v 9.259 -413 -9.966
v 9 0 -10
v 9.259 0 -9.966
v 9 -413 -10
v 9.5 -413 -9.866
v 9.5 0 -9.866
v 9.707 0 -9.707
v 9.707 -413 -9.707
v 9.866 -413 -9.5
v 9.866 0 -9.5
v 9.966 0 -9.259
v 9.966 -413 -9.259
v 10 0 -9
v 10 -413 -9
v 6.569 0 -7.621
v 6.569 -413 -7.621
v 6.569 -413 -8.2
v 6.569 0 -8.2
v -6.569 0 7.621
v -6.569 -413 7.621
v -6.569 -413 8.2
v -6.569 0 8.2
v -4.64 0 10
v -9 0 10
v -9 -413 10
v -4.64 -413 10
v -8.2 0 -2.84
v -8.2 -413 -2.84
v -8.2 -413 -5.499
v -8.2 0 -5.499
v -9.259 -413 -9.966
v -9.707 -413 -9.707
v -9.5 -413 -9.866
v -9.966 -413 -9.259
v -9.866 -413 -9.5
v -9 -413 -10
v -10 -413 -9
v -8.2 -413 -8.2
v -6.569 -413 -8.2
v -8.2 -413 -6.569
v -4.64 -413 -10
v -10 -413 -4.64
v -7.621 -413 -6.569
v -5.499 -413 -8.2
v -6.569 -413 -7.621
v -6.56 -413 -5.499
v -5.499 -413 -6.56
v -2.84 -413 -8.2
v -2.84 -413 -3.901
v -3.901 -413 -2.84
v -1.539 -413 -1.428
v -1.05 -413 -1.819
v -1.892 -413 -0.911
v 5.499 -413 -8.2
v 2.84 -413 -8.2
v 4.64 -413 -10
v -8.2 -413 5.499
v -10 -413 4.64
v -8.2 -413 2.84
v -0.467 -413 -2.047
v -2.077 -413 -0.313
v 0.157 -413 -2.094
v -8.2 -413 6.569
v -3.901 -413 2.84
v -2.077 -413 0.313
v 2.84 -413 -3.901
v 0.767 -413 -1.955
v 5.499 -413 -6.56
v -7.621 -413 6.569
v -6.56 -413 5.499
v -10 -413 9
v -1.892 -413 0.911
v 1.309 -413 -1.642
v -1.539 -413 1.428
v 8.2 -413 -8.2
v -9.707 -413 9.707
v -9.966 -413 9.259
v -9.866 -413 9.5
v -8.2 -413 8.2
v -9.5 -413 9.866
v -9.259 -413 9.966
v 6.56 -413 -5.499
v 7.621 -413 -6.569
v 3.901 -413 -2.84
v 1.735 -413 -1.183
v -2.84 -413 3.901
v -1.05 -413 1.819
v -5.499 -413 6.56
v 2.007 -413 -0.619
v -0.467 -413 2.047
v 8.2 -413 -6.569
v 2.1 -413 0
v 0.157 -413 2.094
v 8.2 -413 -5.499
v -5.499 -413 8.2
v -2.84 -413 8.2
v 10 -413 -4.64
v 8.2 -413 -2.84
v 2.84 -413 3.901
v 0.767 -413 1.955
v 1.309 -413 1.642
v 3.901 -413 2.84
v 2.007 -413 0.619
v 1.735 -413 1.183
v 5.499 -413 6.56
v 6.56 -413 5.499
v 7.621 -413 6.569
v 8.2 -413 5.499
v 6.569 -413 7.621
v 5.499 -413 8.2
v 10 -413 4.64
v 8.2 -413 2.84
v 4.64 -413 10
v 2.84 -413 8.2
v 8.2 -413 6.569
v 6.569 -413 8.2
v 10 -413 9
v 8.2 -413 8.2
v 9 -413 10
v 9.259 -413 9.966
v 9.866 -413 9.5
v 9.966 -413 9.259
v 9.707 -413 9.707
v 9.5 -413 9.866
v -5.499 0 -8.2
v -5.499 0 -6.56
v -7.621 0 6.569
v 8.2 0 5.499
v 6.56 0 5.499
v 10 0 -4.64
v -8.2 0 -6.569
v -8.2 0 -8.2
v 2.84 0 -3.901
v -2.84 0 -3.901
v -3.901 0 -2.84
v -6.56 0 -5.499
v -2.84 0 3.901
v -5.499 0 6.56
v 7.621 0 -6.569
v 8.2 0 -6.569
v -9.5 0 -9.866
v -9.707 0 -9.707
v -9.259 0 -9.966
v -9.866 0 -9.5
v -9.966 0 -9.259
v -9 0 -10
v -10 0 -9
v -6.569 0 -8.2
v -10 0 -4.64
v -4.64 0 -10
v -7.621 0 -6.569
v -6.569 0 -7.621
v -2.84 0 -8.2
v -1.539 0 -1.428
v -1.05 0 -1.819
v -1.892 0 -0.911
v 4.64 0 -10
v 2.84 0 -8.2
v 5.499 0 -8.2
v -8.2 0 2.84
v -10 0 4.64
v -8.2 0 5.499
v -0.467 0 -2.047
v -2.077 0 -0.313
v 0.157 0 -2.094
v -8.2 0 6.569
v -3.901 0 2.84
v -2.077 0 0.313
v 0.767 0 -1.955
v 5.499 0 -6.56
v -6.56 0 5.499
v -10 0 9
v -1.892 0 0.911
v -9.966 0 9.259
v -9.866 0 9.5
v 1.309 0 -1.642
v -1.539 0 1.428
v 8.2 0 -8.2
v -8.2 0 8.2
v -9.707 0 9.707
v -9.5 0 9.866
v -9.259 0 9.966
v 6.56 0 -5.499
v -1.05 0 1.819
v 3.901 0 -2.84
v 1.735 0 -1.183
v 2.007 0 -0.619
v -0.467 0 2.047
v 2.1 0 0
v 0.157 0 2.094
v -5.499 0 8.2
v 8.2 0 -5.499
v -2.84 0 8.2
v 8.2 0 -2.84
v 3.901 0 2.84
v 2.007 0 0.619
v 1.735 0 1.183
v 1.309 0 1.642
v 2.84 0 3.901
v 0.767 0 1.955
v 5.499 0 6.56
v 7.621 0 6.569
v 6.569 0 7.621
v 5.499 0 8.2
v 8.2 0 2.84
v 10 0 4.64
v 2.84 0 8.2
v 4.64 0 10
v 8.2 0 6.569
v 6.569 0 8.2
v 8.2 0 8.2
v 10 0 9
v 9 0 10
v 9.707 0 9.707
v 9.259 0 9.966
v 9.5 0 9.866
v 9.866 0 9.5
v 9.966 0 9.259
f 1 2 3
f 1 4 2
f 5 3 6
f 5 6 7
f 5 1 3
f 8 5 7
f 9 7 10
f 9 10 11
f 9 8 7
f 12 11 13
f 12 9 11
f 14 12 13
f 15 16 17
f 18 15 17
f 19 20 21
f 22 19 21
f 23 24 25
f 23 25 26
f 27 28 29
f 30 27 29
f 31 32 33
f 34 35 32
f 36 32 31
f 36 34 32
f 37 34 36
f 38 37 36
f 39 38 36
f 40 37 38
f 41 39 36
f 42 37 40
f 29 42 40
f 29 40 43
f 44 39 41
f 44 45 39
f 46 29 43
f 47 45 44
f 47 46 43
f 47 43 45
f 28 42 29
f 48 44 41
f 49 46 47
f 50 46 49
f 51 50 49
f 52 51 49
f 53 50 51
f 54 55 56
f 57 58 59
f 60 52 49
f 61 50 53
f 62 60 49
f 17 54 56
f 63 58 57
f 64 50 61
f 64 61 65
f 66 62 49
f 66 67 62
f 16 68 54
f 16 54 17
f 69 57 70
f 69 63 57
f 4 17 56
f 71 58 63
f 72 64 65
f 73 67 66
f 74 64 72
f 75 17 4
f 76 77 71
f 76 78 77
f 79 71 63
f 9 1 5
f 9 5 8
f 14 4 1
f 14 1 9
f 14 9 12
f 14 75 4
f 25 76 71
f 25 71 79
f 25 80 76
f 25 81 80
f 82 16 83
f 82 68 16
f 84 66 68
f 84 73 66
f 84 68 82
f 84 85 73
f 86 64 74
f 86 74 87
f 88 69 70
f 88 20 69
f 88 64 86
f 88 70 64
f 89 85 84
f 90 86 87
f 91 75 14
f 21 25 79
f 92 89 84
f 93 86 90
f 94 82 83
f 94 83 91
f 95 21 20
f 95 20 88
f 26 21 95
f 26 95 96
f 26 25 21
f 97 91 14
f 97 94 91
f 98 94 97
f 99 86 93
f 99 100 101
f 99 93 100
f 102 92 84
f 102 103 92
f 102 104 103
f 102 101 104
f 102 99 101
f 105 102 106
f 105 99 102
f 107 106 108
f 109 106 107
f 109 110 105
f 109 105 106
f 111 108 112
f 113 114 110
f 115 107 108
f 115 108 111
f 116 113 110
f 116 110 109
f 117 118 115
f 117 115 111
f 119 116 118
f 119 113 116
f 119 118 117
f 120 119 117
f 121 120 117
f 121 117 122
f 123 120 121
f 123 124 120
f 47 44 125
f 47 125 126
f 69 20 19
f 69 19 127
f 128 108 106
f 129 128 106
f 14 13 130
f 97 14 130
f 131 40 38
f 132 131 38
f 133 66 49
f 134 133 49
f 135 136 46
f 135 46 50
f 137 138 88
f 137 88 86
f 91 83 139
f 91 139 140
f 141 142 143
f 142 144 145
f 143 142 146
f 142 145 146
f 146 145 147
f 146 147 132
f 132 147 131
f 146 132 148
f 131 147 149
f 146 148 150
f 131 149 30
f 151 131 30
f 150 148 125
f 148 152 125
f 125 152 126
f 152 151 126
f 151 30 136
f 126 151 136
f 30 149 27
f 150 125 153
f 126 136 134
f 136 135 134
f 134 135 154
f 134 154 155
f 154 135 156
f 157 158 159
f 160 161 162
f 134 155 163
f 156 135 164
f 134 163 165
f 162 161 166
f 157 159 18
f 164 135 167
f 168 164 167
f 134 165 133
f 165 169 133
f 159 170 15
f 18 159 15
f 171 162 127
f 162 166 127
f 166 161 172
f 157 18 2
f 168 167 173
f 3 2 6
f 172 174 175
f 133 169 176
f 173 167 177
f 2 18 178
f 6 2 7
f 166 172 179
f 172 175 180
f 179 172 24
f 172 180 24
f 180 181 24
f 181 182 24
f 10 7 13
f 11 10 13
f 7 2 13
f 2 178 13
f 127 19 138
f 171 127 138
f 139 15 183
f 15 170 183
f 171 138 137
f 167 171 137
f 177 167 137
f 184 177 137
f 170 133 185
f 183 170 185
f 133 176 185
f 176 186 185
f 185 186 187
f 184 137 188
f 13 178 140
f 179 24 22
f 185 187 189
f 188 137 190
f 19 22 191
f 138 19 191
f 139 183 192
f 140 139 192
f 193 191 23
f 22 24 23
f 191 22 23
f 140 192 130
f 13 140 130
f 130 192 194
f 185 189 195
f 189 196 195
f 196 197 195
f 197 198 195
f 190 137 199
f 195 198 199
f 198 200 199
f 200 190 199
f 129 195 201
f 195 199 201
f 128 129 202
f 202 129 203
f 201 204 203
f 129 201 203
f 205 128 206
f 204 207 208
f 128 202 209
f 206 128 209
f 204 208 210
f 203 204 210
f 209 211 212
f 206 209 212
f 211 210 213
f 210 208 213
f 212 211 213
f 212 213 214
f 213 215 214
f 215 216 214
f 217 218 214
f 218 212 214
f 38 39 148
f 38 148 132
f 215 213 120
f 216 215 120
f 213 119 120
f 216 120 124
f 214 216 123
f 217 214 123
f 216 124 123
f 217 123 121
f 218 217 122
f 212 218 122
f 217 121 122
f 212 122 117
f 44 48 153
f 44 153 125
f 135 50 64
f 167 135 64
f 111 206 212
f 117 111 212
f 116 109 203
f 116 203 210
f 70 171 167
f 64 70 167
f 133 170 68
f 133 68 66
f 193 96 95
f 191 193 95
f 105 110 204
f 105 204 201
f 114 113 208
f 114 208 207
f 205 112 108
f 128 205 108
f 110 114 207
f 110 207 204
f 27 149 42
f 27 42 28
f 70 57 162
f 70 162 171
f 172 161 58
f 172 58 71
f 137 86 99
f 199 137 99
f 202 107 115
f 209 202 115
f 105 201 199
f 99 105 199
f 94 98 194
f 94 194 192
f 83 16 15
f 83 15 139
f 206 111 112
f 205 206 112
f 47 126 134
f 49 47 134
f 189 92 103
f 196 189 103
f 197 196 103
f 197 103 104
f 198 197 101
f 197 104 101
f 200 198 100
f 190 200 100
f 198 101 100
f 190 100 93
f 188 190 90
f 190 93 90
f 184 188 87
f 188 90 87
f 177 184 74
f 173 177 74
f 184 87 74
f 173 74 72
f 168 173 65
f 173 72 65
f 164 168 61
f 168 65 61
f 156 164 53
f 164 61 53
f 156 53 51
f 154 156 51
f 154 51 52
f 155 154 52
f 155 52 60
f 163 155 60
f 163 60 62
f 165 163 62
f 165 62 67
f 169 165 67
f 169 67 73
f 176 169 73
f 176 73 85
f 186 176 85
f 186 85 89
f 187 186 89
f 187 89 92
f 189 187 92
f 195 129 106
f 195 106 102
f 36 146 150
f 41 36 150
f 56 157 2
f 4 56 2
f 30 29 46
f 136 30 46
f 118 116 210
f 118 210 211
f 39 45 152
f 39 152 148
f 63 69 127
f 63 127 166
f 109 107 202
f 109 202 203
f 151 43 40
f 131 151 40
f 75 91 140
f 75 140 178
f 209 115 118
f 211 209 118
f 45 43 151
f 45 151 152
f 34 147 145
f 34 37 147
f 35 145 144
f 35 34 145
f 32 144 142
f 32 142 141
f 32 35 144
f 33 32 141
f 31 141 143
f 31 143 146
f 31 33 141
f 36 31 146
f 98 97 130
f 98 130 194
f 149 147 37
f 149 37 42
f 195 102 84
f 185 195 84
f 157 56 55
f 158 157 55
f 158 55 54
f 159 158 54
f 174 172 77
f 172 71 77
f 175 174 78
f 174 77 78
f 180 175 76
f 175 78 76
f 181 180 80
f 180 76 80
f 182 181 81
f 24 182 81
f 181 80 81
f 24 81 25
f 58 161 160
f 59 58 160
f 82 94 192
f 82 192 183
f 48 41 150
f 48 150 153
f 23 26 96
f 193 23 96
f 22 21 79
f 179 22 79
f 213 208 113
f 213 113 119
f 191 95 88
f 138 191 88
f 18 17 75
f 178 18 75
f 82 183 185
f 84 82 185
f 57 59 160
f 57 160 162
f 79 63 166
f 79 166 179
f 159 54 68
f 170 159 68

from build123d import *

# Parameters (mm, degrees)
F0_W            = 20
F0_H            = 20
F1_DEPTH        = 413
F2_R            = 2.1
F3_DEPTH        = 413.001
F4_R            = 1
F6_DEPTH        = 413.001
F6_COPIES_COUNT = 4


# Not quite as in the source:
# - a pattern or mirror of a feature is missing from the dataset's text; its kind, count and spacing are read off the source's solid


with BuildPart() as f1:
    # F0 (on Front) → F1 (new body)
    with BuildSketch(Plane.XZ):
        Rectangle(F0_W, F0_H)
    extrude(amount=F1_DEPTH)

    # F2 (on face) → F3 (cut, through all)
    with BuildSketch(Plane.XZ.offset(413)):
        Circle(F2_R)
    extrude(amount=-F3_DEPTH, mode=Mode.SUBTRACT)

    # F4
    f4_edges = [f1.edges().sort_by_distance(p)[0] for p in [
        (-10, -206.5, 10),
        (10, -206.5, 10),
        (10, -206.5, -10),
        (-10, -206.5, -10),
    ]]
    fillet(f4_edges, radius=F4_R)

    # F5 (on face) → F6 (cut, through all)
    with BuildSketch(Plane.XZ.offset(413)):
        Polygon((0, 3.9006601718), (0, 10), (-2.84, 10), (-4.64, 10), (-2.84, 8.2), (-5.4993398282, 8.2), (-5.4993398282, 6.56), (-2.84, 3.9006601718), align=None)
        Polygon((-6.5693398282, 8.2), (-8.2, 8.2), (-7.0953059148, 7.0953059148), (-6.5693398282, 7.6212720014), align=None)
    f6 = extrude(amount=-F6_DEPTH, mode=Mode.SUBTRACT)

    # F6_copies: F6 ×4 about axis
    f6_copies_axis = Axis((0, 0, 0), (0, 1, 0))
    for i in range(1, F6_COPIES_COUNT):
        add(f6.rotate(f6_copies_axis, i * 360 / F6_COPIES_COUNT), mode=Mode.SUBTRACT)

    # F6_copies1: F6 across plane
    add(f6.mirror(Plane(origin=(0, 0, 0), x_dir=(-0.7071067812, 0, -0.7071067812), z_dir=(0.7071067812, 0, -0.7071067812))), mode=Mode.SUBTRACT)

    # F6_copies2: F6 across plane
    add(f6.mirror(Plane(origin=(0, 0, 0), x_dir=(-1, 0, 0), z_dir=(0, 0, -1))), mode=Mode.SUBTRACT)

    # F6_copies3: F6 across plane
    add(f6.mirror(Plane(origin=(0, 0, 0), x_dir=(0, 0, 1), z_dir=(1, 0, 0))), mode=Mode.SUBTRACT)

    # F6_copies4: F6 across plane
    add(f6.mirror(Plane(origin=(0, 0, 0), x_dir=(0.7071067812, 0, -0.7071067812), z_dir=(-0.7071067812, 0, -0.7071067812))), mode=Mode.SUBTRACT)


solid = f1.part
